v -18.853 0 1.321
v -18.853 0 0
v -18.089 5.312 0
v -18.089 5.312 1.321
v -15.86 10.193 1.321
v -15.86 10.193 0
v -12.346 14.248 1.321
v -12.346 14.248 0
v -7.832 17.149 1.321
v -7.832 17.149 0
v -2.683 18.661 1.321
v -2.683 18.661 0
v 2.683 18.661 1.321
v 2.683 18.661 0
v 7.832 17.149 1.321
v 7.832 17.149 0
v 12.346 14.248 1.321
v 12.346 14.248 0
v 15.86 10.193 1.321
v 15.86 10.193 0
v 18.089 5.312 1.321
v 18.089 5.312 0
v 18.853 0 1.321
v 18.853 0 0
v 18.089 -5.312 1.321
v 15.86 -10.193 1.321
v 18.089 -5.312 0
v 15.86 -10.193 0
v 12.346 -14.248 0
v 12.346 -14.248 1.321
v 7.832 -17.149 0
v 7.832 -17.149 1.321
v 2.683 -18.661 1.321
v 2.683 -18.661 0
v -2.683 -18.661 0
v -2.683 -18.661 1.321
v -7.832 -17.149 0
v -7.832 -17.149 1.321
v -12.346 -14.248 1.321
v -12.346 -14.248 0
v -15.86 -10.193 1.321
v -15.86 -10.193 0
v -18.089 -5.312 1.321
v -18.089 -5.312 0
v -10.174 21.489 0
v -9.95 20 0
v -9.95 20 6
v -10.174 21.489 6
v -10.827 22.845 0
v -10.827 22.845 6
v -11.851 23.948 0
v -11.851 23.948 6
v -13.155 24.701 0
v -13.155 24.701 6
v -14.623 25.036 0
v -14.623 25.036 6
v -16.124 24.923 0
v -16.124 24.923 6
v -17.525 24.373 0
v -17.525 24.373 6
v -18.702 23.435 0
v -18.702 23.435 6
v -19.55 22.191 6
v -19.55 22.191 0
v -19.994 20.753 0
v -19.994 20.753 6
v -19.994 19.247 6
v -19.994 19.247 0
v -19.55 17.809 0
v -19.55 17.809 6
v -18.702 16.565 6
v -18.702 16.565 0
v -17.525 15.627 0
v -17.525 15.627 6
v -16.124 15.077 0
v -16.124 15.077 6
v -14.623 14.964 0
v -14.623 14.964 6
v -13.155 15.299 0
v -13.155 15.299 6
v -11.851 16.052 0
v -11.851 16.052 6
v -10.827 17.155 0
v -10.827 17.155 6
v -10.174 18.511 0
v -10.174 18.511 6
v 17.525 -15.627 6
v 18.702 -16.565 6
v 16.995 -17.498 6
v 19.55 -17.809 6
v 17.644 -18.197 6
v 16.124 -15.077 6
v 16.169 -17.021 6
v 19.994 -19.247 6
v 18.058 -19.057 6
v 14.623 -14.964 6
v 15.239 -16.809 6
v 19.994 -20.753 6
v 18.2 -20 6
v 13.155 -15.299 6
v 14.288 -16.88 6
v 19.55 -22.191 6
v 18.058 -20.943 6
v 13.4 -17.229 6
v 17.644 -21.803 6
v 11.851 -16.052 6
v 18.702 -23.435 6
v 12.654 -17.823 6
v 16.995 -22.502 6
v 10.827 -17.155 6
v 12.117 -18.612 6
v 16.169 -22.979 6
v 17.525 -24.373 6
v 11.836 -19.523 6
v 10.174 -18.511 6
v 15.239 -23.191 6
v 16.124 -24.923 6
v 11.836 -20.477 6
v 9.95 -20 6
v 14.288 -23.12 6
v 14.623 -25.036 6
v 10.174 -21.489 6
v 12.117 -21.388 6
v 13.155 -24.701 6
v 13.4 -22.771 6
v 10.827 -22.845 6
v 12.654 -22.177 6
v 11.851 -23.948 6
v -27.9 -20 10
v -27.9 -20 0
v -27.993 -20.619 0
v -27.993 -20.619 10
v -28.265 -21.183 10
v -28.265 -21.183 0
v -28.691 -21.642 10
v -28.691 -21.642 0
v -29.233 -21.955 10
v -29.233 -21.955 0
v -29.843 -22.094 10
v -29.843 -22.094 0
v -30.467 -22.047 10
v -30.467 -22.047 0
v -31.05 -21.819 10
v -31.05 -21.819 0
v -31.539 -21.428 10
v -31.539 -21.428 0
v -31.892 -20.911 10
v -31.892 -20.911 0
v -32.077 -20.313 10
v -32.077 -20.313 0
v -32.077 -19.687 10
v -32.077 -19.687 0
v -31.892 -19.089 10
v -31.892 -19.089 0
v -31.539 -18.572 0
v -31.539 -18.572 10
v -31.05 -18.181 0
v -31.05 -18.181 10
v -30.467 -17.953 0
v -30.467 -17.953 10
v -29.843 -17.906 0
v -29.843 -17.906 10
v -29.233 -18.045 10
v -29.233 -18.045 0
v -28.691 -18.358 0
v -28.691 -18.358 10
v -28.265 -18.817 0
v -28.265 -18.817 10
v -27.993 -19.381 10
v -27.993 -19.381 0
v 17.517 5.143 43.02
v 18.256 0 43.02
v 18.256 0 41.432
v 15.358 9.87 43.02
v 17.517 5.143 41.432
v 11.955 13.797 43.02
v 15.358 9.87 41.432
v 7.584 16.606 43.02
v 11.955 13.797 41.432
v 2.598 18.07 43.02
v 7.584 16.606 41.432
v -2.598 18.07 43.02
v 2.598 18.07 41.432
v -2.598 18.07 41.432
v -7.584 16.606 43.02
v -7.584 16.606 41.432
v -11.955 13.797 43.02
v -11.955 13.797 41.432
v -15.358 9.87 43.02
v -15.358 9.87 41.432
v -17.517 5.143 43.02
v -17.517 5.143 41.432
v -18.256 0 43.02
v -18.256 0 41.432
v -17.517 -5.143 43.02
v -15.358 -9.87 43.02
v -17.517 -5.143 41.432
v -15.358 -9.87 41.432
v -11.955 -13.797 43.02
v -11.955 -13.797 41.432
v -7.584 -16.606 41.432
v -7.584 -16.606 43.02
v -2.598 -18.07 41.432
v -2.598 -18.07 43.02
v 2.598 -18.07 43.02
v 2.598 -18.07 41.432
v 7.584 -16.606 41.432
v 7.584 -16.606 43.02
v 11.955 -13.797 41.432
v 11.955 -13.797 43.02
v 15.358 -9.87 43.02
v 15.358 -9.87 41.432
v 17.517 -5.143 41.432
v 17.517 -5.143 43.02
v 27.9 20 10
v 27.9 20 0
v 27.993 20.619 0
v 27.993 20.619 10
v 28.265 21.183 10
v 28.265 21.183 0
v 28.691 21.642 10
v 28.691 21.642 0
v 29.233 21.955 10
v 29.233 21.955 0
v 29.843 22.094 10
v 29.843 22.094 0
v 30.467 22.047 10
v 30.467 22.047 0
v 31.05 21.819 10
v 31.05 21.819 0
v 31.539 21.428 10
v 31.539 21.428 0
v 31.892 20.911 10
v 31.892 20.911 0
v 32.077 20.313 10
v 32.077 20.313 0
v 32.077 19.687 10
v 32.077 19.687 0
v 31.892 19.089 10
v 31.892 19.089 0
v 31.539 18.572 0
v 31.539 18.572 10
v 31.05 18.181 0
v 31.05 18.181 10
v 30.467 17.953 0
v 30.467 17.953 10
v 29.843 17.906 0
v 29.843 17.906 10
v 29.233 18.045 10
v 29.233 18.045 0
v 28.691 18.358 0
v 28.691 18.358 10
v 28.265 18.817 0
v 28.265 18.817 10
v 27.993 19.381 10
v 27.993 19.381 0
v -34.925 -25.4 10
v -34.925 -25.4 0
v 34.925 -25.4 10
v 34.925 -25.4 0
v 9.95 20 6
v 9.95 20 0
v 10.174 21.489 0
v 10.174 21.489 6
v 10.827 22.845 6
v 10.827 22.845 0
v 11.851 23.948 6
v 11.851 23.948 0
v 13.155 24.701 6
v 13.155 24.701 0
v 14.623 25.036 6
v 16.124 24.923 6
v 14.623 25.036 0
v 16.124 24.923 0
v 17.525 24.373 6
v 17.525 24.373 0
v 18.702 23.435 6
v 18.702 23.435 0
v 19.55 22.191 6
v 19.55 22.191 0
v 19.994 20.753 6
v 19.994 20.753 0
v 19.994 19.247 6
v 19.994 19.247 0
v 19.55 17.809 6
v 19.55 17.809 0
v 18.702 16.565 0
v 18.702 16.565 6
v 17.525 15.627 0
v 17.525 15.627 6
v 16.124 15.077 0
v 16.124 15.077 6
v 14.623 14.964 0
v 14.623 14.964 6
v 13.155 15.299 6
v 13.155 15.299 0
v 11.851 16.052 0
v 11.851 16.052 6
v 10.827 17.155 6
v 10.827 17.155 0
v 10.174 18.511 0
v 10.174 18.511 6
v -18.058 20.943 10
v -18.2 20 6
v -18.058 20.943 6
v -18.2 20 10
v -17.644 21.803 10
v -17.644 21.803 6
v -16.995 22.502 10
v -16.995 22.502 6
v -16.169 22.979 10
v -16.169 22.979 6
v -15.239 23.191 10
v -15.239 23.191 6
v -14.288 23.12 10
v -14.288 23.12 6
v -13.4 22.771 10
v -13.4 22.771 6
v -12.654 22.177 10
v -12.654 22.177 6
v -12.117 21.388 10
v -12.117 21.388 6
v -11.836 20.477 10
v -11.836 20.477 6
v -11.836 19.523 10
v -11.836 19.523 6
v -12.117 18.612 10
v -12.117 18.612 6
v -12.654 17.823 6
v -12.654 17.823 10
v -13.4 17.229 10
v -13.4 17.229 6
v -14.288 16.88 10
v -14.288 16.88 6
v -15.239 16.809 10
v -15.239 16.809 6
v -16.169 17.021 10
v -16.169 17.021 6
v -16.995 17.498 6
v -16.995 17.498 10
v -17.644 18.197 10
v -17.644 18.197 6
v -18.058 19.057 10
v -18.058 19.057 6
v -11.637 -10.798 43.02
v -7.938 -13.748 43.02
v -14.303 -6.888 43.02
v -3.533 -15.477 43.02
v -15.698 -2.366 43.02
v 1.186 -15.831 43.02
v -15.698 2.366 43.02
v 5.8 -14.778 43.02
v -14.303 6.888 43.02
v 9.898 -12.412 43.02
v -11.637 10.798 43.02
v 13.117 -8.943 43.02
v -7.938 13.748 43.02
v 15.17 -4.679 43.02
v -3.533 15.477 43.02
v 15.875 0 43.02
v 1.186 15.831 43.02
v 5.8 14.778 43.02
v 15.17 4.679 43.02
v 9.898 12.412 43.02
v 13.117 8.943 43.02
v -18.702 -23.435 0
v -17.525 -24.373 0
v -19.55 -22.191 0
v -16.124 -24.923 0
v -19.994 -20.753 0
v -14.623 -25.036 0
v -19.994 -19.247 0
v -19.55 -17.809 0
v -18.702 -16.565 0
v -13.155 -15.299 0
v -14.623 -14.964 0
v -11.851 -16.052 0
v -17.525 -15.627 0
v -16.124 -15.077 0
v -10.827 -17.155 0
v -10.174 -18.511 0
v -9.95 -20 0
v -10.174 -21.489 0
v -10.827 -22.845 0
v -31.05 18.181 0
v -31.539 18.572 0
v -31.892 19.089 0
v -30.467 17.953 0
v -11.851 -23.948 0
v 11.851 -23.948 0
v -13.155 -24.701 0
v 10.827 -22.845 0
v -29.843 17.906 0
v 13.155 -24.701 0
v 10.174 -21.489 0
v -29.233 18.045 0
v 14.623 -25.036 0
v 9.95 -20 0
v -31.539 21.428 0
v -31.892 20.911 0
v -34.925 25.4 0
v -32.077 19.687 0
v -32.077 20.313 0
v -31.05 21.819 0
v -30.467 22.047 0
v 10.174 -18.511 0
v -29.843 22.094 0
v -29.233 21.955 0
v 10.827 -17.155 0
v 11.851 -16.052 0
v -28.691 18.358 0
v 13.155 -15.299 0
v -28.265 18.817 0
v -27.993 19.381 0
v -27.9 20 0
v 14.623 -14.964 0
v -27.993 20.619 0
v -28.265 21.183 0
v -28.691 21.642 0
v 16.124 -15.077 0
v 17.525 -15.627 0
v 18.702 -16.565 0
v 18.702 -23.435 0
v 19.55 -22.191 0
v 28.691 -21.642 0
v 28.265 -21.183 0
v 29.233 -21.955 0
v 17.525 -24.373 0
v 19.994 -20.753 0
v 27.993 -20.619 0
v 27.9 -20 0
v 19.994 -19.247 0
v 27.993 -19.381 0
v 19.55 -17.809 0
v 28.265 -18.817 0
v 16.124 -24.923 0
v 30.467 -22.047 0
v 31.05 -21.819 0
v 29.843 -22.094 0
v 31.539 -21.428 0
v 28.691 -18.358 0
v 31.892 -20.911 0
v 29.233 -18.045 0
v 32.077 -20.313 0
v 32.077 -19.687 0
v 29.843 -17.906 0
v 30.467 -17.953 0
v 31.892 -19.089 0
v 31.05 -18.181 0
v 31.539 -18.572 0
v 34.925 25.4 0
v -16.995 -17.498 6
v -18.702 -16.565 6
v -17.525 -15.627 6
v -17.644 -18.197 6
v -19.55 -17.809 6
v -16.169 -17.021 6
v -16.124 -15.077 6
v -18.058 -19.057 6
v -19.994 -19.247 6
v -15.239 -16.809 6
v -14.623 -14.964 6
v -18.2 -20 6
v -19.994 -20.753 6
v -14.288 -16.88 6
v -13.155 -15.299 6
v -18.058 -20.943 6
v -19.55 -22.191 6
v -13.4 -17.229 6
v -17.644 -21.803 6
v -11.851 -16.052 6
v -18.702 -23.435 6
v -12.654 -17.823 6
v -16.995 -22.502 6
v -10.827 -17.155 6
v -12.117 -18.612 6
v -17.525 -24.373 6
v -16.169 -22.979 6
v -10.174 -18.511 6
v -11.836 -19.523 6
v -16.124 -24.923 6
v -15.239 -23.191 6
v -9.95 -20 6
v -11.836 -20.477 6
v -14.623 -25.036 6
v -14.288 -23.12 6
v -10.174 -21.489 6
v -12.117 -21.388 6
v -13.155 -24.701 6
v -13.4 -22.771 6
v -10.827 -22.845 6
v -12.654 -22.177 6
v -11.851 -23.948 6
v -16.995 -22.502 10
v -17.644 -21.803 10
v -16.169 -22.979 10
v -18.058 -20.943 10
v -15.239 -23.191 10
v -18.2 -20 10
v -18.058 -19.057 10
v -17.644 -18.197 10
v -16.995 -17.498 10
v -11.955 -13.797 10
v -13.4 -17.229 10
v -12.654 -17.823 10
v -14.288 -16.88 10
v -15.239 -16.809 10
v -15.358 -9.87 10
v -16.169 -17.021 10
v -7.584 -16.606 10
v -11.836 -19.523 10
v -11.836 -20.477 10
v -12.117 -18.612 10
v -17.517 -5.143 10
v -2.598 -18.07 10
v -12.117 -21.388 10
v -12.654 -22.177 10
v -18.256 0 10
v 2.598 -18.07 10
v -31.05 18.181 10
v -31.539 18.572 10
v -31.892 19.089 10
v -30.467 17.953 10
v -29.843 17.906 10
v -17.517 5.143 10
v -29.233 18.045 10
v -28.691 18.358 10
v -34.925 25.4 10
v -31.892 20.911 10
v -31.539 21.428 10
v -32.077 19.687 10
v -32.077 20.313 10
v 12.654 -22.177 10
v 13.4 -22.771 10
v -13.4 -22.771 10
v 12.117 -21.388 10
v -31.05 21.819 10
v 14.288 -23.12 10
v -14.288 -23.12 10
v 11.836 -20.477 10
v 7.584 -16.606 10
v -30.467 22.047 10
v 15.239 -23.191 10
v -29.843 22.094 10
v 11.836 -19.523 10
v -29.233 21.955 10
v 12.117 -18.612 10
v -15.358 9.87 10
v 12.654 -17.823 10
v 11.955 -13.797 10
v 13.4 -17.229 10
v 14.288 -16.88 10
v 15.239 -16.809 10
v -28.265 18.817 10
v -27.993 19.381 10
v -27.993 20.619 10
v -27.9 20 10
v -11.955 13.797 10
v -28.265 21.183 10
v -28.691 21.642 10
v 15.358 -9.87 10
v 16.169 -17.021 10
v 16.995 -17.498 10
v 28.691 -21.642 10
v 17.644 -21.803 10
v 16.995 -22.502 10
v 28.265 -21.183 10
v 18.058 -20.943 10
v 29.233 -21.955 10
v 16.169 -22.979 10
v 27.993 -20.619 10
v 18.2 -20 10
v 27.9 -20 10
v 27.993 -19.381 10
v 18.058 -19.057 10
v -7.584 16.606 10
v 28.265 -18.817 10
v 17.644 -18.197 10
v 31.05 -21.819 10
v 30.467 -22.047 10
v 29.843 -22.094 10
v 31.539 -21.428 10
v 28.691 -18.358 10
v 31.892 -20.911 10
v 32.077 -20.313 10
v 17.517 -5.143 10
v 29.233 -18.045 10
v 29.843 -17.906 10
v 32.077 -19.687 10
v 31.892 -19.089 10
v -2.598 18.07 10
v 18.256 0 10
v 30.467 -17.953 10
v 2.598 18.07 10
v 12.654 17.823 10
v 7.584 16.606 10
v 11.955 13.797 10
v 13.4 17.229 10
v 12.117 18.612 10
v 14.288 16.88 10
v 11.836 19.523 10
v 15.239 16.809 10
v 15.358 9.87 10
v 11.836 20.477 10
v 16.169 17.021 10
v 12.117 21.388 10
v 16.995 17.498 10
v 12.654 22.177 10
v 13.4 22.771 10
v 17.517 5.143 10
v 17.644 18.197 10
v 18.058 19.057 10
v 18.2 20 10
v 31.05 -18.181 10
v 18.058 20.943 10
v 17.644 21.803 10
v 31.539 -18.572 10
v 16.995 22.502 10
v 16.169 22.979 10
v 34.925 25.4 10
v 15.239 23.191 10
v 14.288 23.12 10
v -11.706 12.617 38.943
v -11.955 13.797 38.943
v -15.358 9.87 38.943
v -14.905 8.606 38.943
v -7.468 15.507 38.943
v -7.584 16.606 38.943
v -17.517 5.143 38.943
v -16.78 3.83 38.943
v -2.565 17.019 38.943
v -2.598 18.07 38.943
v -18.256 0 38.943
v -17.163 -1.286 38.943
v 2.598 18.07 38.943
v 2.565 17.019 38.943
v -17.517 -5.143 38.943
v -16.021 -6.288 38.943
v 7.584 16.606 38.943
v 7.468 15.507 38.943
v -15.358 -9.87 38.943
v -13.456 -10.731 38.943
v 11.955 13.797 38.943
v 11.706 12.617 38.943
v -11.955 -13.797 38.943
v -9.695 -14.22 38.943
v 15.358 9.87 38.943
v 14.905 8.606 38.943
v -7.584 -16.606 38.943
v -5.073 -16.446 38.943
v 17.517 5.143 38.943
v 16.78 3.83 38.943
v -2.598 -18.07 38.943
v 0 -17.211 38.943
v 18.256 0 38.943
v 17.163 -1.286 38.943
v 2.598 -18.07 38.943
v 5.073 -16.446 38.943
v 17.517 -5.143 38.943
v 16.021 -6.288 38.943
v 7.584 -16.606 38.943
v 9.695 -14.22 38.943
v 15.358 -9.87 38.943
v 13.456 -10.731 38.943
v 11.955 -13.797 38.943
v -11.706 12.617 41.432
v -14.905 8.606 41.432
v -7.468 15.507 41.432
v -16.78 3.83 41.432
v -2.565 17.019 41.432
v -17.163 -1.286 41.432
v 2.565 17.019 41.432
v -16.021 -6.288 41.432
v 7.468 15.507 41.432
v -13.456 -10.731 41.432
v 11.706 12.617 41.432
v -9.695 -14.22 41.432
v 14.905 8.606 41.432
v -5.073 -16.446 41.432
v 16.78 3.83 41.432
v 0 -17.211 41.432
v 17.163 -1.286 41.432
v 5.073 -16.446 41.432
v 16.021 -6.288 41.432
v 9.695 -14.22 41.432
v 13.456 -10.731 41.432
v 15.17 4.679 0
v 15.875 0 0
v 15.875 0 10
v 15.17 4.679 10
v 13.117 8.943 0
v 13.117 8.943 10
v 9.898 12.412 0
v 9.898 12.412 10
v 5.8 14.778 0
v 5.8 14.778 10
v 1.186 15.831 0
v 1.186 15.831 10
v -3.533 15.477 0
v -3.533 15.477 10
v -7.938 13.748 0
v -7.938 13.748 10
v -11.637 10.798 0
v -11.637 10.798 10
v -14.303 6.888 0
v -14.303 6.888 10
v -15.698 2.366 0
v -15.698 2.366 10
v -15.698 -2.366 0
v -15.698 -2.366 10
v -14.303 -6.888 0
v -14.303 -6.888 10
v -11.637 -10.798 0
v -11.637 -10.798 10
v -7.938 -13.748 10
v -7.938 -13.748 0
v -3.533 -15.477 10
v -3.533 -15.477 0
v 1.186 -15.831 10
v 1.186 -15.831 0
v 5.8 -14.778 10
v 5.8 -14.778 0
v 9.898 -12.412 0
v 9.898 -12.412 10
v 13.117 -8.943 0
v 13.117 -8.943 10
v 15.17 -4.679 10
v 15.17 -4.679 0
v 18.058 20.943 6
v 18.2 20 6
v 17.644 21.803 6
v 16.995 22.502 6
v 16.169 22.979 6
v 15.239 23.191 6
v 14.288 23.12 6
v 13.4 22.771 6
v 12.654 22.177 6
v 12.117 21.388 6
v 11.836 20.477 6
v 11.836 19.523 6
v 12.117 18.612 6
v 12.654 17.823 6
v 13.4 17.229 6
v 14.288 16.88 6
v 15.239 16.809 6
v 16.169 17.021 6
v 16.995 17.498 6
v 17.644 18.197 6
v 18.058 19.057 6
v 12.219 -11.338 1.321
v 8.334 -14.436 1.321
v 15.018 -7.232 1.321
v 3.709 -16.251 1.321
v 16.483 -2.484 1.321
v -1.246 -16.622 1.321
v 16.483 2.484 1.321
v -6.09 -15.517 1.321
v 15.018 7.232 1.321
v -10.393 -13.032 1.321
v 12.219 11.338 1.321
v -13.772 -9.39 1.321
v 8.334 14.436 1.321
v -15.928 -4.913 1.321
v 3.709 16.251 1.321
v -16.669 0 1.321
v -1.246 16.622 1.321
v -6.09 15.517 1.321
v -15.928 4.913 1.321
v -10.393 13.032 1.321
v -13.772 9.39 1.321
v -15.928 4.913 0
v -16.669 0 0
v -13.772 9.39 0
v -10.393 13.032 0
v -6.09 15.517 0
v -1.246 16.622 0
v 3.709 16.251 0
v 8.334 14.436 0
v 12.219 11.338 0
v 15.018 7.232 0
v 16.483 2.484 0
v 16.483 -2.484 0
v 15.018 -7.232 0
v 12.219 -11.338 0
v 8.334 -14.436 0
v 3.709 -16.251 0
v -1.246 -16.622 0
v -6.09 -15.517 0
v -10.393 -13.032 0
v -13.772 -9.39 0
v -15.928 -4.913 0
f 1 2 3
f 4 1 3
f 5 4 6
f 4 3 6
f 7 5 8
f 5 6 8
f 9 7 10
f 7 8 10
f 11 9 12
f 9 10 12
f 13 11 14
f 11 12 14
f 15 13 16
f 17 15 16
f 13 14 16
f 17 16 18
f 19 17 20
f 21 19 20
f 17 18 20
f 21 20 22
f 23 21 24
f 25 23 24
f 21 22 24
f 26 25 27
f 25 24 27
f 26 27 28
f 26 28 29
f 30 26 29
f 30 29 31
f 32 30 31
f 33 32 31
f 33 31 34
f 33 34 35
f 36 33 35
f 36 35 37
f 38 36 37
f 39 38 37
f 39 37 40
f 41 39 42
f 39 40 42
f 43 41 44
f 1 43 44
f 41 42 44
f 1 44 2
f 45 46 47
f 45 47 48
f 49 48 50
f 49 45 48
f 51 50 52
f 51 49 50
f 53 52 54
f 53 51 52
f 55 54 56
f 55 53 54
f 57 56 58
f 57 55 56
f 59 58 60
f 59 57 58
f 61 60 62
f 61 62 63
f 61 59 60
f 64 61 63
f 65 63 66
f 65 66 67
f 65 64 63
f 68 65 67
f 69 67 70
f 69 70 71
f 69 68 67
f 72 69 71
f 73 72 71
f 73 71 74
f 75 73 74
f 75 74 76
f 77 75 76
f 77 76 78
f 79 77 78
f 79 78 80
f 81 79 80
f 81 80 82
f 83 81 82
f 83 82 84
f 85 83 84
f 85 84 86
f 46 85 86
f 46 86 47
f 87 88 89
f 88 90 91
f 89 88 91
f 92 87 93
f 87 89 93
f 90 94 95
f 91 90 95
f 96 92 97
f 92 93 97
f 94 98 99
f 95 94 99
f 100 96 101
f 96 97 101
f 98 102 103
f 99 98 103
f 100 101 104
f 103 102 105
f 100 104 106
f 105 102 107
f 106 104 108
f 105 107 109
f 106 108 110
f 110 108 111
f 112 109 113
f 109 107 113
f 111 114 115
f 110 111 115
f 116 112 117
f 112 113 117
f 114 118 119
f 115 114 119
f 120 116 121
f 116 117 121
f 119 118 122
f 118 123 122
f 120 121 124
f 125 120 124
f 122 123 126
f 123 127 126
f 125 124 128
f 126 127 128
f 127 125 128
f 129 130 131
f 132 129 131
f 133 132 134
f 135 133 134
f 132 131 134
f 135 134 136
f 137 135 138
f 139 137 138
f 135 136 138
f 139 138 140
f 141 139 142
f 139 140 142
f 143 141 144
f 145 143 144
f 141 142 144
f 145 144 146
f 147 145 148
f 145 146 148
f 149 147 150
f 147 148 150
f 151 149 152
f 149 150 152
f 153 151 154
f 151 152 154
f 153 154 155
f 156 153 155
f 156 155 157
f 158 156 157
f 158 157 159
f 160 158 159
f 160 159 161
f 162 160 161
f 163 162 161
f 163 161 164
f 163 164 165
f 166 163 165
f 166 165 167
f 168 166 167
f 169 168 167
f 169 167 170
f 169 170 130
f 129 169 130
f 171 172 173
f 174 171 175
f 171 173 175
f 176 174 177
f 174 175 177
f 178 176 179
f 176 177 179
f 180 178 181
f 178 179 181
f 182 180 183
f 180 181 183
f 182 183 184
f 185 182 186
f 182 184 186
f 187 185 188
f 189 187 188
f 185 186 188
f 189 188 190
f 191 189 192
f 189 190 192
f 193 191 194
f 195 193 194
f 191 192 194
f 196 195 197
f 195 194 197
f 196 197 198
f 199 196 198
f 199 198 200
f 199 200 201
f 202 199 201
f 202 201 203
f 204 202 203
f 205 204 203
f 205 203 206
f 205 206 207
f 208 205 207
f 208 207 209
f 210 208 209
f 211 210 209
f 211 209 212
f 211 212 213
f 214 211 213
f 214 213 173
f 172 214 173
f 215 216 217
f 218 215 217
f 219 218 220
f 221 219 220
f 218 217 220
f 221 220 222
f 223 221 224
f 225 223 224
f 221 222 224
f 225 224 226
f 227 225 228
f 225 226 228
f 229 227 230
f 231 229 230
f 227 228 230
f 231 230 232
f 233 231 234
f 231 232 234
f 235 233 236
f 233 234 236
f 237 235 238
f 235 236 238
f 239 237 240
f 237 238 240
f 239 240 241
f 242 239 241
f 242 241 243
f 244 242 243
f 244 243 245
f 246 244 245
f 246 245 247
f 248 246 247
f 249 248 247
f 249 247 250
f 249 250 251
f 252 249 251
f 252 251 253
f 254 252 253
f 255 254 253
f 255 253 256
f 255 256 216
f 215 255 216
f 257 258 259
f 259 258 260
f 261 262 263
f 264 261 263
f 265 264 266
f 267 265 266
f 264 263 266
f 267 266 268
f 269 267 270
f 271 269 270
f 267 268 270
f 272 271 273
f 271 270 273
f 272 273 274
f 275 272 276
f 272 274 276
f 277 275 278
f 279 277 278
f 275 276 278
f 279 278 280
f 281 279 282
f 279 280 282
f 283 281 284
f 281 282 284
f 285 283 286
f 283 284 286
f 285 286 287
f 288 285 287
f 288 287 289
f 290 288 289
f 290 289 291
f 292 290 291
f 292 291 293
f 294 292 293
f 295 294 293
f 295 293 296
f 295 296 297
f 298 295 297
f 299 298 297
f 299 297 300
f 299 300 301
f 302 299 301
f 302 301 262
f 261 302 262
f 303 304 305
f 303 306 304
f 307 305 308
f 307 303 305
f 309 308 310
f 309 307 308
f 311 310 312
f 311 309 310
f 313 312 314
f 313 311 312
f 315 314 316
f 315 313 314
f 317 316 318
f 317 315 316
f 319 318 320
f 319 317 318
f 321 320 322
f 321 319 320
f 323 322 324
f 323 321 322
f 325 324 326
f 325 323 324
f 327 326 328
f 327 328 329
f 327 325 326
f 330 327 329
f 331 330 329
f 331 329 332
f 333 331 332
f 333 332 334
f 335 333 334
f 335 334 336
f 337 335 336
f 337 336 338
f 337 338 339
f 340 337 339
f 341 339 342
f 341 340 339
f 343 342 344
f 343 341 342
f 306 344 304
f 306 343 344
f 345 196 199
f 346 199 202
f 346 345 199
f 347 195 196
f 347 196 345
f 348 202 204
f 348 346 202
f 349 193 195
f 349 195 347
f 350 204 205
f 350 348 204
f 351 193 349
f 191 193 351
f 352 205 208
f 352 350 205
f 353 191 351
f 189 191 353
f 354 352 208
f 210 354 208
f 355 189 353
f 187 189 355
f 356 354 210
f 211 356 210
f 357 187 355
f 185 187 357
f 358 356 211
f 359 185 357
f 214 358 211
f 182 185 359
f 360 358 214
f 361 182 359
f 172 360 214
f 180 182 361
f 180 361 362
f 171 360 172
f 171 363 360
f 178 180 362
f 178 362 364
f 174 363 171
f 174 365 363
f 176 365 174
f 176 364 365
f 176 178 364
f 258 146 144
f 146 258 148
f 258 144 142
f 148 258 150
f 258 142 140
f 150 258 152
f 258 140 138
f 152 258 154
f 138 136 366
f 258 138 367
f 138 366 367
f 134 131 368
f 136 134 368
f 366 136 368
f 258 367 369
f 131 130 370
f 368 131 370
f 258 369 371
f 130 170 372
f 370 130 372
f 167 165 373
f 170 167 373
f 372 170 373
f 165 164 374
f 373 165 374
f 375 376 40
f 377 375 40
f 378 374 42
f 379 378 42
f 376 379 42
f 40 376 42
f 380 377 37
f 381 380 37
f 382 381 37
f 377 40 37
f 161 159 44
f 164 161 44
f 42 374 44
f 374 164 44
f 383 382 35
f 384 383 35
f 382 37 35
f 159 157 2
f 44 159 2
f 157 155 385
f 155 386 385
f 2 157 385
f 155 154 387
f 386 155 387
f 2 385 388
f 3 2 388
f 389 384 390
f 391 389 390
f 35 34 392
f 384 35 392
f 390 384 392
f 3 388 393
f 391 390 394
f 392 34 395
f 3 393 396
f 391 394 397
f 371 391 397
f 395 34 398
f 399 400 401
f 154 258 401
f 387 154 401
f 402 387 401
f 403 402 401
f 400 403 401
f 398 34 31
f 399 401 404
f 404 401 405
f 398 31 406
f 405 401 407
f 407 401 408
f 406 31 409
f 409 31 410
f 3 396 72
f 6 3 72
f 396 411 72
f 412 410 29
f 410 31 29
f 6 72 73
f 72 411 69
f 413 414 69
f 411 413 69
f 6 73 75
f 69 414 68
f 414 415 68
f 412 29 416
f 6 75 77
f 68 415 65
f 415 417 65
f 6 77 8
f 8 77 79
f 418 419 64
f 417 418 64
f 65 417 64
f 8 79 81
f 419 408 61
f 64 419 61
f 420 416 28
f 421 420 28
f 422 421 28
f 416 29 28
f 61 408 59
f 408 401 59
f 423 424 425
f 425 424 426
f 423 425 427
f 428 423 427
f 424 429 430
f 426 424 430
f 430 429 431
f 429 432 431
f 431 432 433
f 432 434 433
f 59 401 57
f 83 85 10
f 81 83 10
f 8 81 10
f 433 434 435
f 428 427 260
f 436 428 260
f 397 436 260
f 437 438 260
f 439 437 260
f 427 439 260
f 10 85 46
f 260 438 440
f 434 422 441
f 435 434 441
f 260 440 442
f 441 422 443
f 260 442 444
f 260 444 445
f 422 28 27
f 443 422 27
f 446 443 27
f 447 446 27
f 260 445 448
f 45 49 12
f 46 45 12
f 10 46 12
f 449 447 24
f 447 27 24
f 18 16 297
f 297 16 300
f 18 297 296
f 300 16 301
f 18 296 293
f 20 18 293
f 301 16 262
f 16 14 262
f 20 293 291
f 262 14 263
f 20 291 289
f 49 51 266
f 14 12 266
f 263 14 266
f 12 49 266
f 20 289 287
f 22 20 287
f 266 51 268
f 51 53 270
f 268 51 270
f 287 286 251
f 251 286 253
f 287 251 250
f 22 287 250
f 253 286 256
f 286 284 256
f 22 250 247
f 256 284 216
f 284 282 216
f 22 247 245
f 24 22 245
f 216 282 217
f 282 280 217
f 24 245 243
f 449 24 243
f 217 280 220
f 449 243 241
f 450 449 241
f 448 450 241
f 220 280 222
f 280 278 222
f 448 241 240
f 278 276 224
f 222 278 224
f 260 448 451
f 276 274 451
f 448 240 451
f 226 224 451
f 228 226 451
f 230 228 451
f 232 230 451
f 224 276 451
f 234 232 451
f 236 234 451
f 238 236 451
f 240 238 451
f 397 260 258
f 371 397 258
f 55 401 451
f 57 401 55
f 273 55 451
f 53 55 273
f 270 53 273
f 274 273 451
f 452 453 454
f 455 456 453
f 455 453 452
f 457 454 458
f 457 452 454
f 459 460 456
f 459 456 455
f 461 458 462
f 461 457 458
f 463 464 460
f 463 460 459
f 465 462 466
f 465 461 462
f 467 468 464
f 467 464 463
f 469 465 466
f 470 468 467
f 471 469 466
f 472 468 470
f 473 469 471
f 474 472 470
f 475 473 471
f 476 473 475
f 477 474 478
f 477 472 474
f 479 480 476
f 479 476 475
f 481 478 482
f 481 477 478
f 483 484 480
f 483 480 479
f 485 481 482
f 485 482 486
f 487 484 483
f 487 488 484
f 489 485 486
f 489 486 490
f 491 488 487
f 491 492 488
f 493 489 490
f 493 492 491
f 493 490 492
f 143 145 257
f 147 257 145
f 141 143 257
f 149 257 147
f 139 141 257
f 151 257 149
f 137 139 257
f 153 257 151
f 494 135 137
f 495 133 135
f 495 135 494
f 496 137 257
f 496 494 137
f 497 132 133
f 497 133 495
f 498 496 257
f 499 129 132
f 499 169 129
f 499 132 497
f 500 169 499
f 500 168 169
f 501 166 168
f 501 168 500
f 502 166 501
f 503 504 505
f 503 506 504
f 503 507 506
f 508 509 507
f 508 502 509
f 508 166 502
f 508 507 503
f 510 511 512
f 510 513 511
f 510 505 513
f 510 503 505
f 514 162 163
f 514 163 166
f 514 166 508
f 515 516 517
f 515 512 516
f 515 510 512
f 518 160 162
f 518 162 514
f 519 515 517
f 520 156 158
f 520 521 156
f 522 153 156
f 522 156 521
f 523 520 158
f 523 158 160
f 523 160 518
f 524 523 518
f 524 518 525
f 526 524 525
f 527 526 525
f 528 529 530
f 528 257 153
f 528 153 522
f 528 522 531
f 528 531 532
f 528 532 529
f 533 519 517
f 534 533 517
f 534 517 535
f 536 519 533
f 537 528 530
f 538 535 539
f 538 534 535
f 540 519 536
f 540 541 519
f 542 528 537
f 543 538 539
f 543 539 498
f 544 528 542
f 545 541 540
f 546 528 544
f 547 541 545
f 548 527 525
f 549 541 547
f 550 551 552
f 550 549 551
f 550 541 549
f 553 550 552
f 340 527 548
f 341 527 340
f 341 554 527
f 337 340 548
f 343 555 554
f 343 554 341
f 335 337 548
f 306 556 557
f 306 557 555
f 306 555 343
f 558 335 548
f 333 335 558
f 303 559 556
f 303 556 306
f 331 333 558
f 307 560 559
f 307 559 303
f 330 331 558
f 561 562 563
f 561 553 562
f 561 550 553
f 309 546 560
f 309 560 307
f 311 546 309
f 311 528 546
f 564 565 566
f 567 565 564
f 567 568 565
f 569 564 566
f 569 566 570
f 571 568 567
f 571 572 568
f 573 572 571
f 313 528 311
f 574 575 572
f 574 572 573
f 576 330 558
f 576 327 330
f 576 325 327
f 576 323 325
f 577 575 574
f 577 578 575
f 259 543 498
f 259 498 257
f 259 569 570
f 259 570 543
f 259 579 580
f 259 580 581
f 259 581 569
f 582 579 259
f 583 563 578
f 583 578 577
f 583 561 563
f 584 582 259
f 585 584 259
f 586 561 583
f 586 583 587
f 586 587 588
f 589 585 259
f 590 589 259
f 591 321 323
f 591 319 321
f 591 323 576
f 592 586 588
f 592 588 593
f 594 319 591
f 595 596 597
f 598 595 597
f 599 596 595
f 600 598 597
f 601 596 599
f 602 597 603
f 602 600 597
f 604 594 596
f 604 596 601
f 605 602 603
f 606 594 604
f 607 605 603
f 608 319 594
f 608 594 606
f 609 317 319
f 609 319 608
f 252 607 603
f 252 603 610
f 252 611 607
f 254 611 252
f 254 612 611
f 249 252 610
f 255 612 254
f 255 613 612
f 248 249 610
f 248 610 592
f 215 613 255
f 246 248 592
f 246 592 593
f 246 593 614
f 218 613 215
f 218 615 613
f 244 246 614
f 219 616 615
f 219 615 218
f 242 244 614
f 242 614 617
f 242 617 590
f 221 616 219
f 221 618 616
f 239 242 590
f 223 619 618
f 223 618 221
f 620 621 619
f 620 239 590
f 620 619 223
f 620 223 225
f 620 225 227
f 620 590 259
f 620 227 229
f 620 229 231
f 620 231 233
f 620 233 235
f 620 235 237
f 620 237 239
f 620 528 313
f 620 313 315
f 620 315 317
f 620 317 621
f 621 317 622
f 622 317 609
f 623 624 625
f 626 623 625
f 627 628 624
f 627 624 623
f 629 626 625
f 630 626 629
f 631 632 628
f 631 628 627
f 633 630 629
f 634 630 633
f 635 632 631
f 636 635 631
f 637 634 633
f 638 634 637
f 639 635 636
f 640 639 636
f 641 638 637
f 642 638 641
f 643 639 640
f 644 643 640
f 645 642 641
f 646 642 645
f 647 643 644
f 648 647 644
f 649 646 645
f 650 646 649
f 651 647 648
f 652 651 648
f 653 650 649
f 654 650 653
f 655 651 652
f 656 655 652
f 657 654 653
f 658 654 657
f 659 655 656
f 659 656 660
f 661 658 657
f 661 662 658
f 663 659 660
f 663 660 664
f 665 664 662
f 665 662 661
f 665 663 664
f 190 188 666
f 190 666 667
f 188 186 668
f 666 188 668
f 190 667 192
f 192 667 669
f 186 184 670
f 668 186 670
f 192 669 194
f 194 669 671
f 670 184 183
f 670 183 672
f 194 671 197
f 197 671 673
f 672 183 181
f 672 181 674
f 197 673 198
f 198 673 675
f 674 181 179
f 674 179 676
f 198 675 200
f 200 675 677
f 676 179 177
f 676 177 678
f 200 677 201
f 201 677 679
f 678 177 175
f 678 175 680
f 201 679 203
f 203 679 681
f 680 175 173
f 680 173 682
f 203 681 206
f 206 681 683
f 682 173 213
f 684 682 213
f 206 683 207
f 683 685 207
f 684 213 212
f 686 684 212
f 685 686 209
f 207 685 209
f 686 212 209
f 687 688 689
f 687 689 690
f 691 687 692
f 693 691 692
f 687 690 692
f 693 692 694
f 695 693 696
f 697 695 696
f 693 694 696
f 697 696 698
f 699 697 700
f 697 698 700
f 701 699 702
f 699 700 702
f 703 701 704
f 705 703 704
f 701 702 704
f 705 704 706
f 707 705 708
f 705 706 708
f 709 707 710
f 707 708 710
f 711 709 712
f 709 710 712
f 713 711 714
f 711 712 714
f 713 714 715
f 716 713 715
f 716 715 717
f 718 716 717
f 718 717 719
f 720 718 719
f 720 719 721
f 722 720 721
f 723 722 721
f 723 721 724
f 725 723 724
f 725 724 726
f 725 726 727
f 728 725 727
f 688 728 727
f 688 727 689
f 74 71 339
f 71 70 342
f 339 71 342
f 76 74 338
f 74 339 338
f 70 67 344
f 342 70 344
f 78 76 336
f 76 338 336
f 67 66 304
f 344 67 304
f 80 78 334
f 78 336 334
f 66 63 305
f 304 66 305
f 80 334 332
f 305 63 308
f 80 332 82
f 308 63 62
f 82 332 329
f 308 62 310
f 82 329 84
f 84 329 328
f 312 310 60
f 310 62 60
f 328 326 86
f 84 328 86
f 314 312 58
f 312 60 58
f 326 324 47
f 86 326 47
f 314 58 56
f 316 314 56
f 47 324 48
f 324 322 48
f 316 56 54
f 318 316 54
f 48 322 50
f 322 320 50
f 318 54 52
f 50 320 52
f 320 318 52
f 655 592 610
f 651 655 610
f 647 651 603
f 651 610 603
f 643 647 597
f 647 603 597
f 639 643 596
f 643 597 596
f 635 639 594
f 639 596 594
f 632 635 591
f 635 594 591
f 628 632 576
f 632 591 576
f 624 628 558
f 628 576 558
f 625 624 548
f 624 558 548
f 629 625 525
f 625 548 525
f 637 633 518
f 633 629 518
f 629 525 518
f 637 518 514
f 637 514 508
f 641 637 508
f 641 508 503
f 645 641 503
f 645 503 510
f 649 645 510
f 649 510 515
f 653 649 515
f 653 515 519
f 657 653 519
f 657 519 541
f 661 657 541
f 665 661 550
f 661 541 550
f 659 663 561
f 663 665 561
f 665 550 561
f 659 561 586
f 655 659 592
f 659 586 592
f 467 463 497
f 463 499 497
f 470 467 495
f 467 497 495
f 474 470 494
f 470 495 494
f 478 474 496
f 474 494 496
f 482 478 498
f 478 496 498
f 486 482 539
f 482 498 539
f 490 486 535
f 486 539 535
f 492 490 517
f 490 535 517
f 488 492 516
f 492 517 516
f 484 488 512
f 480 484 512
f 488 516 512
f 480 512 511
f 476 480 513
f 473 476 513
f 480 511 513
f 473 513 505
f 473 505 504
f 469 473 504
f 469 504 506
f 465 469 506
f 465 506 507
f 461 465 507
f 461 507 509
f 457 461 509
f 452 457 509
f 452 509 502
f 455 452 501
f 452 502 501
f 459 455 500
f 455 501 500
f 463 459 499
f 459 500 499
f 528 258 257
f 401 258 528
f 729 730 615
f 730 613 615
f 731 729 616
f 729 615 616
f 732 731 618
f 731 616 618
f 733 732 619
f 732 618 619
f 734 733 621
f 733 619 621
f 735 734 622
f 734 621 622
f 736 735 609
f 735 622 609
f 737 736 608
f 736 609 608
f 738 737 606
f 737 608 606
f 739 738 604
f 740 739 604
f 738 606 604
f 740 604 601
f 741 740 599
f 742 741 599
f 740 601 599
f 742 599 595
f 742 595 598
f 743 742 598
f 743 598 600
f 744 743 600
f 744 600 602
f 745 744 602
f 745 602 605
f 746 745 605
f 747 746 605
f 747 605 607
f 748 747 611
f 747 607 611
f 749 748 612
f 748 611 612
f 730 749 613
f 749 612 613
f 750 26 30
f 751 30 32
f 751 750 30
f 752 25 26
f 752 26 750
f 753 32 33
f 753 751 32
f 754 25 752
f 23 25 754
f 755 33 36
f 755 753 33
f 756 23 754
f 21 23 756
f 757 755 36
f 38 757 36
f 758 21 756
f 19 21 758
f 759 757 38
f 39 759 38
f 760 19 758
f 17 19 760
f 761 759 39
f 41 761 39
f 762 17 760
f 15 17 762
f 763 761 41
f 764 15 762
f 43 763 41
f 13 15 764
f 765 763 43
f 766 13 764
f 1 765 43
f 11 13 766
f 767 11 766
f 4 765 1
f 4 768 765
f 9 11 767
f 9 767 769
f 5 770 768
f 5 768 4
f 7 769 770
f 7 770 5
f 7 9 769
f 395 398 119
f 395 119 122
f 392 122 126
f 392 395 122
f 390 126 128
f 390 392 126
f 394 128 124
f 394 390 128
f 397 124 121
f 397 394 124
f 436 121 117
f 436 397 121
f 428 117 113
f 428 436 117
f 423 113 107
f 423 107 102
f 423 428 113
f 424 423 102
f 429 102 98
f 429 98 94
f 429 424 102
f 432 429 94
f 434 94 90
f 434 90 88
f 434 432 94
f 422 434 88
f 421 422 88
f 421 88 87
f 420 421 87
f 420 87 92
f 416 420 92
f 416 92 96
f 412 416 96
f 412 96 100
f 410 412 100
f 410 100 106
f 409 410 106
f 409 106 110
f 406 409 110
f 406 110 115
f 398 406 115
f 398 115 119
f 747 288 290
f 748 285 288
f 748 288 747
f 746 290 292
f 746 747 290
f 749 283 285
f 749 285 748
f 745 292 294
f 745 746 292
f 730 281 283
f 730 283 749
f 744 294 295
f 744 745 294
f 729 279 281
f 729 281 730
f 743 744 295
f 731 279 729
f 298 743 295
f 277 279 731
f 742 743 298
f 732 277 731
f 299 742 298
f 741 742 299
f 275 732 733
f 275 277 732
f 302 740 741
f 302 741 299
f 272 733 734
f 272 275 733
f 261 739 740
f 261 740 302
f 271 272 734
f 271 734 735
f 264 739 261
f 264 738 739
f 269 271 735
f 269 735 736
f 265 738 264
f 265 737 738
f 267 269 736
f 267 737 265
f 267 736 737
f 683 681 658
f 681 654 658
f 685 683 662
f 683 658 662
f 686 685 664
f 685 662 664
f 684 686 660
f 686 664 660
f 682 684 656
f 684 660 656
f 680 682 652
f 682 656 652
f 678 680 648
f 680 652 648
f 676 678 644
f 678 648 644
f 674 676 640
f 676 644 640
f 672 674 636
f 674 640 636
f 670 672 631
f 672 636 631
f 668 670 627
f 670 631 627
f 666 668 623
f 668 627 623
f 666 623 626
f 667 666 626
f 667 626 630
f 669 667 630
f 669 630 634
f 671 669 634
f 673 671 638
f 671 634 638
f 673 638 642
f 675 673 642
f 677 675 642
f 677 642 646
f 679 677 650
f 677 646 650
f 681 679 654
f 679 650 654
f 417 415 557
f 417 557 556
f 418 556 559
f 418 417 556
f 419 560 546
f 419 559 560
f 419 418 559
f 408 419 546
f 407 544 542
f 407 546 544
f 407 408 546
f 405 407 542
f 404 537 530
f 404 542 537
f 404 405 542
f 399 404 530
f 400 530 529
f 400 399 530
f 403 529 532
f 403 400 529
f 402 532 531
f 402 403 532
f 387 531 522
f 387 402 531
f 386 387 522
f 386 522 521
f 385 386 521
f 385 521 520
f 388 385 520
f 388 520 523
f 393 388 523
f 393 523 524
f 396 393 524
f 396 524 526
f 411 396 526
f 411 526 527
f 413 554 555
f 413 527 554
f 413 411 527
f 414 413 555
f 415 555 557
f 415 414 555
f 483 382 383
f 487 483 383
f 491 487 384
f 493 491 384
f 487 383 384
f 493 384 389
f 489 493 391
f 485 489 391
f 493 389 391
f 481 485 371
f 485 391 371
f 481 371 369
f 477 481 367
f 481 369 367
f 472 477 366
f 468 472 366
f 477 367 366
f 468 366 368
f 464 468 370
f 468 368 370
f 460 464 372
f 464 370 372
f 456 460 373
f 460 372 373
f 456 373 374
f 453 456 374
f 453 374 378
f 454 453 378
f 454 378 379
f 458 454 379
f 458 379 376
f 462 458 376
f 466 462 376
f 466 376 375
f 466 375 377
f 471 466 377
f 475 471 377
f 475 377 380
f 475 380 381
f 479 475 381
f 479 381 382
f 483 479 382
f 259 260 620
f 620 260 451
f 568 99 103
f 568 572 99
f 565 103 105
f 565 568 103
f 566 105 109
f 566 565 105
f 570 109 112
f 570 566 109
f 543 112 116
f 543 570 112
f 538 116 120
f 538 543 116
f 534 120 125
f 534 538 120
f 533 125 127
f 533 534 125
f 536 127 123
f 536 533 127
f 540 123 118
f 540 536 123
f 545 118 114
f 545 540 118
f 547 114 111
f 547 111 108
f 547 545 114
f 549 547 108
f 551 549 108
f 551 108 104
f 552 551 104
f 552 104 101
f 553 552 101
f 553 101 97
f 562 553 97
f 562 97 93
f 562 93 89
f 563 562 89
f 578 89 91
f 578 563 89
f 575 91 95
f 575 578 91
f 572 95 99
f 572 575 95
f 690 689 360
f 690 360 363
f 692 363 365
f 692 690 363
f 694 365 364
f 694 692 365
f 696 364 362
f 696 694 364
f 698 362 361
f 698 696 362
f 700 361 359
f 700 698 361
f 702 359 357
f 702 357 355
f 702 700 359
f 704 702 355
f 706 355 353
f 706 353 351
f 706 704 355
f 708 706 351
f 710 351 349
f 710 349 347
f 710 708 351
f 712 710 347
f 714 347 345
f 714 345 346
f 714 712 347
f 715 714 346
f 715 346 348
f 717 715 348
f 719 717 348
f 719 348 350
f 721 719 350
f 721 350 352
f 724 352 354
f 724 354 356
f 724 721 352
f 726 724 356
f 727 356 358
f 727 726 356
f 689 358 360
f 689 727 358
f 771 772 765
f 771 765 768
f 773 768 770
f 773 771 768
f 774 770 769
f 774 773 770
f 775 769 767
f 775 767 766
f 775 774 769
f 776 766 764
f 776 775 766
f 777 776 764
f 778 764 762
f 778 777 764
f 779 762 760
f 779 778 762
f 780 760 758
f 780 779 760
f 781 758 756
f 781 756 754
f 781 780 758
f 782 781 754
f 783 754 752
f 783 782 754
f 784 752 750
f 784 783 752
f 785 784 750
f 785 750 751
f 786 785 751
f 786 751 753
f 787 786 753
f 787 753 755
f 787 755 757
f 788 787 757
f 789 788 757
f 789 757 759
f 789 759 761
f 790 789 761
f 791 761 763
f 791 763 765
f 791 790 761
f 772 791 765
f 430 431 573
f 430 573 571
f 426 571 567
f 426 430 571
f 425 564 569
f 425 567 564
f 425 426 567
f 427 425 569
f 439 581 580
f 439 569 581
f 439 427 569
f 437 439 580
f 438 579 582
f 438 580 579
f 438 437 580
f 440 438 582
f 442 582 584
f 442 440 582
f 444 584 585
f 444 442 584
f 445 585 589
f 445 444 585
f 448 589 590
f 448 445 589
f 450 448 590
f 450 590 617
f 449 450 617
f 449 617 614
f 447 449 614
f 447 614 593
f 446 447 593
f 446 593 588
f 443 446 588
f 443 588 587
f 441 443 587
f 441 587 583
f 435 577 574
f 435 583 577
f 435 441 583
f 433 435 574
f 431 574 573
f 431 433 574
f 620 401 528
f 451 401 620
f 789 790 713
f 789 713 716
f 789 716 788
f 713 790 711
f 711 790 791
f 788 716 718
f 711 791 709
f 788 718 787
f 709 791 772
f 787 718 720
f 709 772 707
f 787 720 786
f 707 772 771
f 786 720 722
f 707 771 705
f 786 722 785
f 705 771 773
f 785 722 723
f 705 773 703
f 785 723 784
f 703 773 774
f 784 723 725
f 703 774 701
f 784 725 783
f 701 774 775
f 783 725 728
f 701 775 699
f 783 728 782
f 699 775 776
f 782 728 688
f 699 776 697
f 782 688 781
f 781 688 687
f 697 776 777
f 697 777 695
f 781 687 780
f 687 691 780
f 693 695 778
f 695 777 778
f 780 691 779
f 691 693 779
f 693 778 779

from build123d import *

# Parameters (mm, degrees)
SKETCH1_W                      = 69.85
SKETCH1_H                      = 50.8
BOSS_EXTRUDE1_DEPTH            = 10
SKETCH2_R                      = 15.875
CUT_EXTRUDE1_DEPTH             = 11
M5X0_8_TAPPED_HOLE1_D          = 4.2
CBORE_FOR_M6_SHCS1_D           = 6.4
CBORE_FOR_M6_SHCS1_CBORE_D     = 10.1
CBORE_FOR_M6_SHCS1_CBORE_DEPTH = 6
MIRROR2_COPY_1_D               = 4.2
MIRROR2_COPY_2_D               = 6.4
MIRROR2_COPY_2_CBORE_D         = 10.1
MIRROR2_COPY_2_CBORE_DEPTH     = 6
SKETCH7_R                      = 18.25625
SKETCH7_R_2                    = 15.875
BOSS_EXTRUDE2_DEPTH            = 33.02
SKETCH8_R                      = 18.85315
SKETCH8_R_2                    = 16.66875
CUT_EXTRUDE2_DEPTH             = 1.3208
SKETCH9_W                      = 2.4892
SKETCH9_H                      = 1.2954


with BuildPart() as part:
    # Sketch1 → Boss-Extrude1 (new body)
    with BuildSketch(Plane.XY):
        Rectangle(SKETCH1_W, SKETCH1_H)
    extrude(amount=BOSS_EXTRUDE1_DEPTH)

    # Sketch2 → Cut-Extrude1 (cut, through all)
    with BuildSketch(Plane.XY.offset(10)):
        Circle(SKETCH2_R)
    extrude(amount=-CUT_EXTRUDE1_DEPTH, mode=Mode.SUBTRACT)

    # M5x0.8 Tapped Hole1 (through all)
    with Locations(Plane.XY.offset(10)):
        with Locations((30, 19.999999878)):
            m5x0_8_tapped_hole1 = Hole(M5X0_8_TAPPED_HOLE1_D / 2)

    # CBORE for M6 SHCS1 (through all)
    with Locations(Plane(origin=(0, 0, 0), x_dir=(-1, 0, 0), z_dir=(0, 0, -1))):
        with Locations((-15, 20)):
            cbore_for_m6_shcs1 = CounterBoreHole(CBORE_FOR_M6_SHCS1_D / 2, CBORE_FOR_M6_SHCS1_CBORE_D / 2, CBORE_FOR_M6_SHCS1_CBORE_DEPTH)

    # Mirror1: M5x0.8 Tapped Hole1, CBORE for M6 SHCS1 across plane
    add(m5x0_8_tapped_hole1.mirror(Plane.ZX), mode=Mode.SUBTRACT)
    add(cbore_for_m6_shcs1.mirror(Plane.ZX), mode=Mode.SUBTRACT)

    # Mirror2: M5x0.8 Tapped Hole1, CBORE for M6 SHCS1 across plane
    add(m5x0_8_tapped_hole1.mirror(Plane(origin=(0, 0, 0), x_dir=(0, 0, 1), z_dir=(1, 0, 0))), mode=Mode.SUBTRACT)
    add(cbore_for_m6_shcs1.mirror(Plane(origin=(0, 0, 0), x_dir=(0, 0, 1), z_dir=(1, 0, 0))), mode=Mode.SUBTRACT)

    # Mirror2 copy 1 (through all)
    with Locations(Plane(origin=(0, 0, 10), x_dir=(-1, 0, 0), z_dir=(0, 0, 1))):
        with Locations((30, 19.999999878)):
            Hole(MIRROR2_COPY_1_D / 2)

    # Mirror2 copy 2 (through all)
    with Locations(Plane(origin=(0, 0, 0), x_dir=(1, 0, 0), z_dir=(0, 0, -1))):
        with Locations((-15, 20)):
            CounterBoreHole(MIRROR2_COPY_2_D / 2, MIRROR2_COPY_2_CBORE_D / 2, MIRROR2_COPY_2_CBORE_DEPTH)

    # Sketch7 → Boss-Extrude2 (add)
    with BuildSketch(Plane.XY.offset(10)):
        Circle(SKETCH7_R)
        Circle(SKETCH7_R_2, mode=Mode.SUBTRACT)
    extrude(amount=BOSS_EXTRUDE2_DEPTH)

    # Sketch8 → Cut-Extrude2 (cut)
    with BuildSketch(Plane(origin=(0, 0, 0), x_dir=(-1, 0, 0), z_dir=(0, 0, -1))):
        Circle(SKETCH8_R)
        Circle(SKETCH8_R_2, mode=Mode.SUBTRACT)
    extrude(amount=-CUT_EXTRUDE2_DEPTH, mode=Mode.SUBTRACT)

    # Sketch9 → Cut-Revolve1 (revolve, cut)
    with BuildSketch(Plane(origin=(0, 0, 0), x_dir=(0, 0, -1), z_dir=(1, 0, 0))):
        with Locations((-40.1879, -17.85874)):
            Rectangle(SKETCH9_W, SKETCH9_H)
    revolve(axis=Axis((0, 0, -4.391211434), (0, 0, 1)), mode=Mode.SUBTRACT)


solid = part.part
